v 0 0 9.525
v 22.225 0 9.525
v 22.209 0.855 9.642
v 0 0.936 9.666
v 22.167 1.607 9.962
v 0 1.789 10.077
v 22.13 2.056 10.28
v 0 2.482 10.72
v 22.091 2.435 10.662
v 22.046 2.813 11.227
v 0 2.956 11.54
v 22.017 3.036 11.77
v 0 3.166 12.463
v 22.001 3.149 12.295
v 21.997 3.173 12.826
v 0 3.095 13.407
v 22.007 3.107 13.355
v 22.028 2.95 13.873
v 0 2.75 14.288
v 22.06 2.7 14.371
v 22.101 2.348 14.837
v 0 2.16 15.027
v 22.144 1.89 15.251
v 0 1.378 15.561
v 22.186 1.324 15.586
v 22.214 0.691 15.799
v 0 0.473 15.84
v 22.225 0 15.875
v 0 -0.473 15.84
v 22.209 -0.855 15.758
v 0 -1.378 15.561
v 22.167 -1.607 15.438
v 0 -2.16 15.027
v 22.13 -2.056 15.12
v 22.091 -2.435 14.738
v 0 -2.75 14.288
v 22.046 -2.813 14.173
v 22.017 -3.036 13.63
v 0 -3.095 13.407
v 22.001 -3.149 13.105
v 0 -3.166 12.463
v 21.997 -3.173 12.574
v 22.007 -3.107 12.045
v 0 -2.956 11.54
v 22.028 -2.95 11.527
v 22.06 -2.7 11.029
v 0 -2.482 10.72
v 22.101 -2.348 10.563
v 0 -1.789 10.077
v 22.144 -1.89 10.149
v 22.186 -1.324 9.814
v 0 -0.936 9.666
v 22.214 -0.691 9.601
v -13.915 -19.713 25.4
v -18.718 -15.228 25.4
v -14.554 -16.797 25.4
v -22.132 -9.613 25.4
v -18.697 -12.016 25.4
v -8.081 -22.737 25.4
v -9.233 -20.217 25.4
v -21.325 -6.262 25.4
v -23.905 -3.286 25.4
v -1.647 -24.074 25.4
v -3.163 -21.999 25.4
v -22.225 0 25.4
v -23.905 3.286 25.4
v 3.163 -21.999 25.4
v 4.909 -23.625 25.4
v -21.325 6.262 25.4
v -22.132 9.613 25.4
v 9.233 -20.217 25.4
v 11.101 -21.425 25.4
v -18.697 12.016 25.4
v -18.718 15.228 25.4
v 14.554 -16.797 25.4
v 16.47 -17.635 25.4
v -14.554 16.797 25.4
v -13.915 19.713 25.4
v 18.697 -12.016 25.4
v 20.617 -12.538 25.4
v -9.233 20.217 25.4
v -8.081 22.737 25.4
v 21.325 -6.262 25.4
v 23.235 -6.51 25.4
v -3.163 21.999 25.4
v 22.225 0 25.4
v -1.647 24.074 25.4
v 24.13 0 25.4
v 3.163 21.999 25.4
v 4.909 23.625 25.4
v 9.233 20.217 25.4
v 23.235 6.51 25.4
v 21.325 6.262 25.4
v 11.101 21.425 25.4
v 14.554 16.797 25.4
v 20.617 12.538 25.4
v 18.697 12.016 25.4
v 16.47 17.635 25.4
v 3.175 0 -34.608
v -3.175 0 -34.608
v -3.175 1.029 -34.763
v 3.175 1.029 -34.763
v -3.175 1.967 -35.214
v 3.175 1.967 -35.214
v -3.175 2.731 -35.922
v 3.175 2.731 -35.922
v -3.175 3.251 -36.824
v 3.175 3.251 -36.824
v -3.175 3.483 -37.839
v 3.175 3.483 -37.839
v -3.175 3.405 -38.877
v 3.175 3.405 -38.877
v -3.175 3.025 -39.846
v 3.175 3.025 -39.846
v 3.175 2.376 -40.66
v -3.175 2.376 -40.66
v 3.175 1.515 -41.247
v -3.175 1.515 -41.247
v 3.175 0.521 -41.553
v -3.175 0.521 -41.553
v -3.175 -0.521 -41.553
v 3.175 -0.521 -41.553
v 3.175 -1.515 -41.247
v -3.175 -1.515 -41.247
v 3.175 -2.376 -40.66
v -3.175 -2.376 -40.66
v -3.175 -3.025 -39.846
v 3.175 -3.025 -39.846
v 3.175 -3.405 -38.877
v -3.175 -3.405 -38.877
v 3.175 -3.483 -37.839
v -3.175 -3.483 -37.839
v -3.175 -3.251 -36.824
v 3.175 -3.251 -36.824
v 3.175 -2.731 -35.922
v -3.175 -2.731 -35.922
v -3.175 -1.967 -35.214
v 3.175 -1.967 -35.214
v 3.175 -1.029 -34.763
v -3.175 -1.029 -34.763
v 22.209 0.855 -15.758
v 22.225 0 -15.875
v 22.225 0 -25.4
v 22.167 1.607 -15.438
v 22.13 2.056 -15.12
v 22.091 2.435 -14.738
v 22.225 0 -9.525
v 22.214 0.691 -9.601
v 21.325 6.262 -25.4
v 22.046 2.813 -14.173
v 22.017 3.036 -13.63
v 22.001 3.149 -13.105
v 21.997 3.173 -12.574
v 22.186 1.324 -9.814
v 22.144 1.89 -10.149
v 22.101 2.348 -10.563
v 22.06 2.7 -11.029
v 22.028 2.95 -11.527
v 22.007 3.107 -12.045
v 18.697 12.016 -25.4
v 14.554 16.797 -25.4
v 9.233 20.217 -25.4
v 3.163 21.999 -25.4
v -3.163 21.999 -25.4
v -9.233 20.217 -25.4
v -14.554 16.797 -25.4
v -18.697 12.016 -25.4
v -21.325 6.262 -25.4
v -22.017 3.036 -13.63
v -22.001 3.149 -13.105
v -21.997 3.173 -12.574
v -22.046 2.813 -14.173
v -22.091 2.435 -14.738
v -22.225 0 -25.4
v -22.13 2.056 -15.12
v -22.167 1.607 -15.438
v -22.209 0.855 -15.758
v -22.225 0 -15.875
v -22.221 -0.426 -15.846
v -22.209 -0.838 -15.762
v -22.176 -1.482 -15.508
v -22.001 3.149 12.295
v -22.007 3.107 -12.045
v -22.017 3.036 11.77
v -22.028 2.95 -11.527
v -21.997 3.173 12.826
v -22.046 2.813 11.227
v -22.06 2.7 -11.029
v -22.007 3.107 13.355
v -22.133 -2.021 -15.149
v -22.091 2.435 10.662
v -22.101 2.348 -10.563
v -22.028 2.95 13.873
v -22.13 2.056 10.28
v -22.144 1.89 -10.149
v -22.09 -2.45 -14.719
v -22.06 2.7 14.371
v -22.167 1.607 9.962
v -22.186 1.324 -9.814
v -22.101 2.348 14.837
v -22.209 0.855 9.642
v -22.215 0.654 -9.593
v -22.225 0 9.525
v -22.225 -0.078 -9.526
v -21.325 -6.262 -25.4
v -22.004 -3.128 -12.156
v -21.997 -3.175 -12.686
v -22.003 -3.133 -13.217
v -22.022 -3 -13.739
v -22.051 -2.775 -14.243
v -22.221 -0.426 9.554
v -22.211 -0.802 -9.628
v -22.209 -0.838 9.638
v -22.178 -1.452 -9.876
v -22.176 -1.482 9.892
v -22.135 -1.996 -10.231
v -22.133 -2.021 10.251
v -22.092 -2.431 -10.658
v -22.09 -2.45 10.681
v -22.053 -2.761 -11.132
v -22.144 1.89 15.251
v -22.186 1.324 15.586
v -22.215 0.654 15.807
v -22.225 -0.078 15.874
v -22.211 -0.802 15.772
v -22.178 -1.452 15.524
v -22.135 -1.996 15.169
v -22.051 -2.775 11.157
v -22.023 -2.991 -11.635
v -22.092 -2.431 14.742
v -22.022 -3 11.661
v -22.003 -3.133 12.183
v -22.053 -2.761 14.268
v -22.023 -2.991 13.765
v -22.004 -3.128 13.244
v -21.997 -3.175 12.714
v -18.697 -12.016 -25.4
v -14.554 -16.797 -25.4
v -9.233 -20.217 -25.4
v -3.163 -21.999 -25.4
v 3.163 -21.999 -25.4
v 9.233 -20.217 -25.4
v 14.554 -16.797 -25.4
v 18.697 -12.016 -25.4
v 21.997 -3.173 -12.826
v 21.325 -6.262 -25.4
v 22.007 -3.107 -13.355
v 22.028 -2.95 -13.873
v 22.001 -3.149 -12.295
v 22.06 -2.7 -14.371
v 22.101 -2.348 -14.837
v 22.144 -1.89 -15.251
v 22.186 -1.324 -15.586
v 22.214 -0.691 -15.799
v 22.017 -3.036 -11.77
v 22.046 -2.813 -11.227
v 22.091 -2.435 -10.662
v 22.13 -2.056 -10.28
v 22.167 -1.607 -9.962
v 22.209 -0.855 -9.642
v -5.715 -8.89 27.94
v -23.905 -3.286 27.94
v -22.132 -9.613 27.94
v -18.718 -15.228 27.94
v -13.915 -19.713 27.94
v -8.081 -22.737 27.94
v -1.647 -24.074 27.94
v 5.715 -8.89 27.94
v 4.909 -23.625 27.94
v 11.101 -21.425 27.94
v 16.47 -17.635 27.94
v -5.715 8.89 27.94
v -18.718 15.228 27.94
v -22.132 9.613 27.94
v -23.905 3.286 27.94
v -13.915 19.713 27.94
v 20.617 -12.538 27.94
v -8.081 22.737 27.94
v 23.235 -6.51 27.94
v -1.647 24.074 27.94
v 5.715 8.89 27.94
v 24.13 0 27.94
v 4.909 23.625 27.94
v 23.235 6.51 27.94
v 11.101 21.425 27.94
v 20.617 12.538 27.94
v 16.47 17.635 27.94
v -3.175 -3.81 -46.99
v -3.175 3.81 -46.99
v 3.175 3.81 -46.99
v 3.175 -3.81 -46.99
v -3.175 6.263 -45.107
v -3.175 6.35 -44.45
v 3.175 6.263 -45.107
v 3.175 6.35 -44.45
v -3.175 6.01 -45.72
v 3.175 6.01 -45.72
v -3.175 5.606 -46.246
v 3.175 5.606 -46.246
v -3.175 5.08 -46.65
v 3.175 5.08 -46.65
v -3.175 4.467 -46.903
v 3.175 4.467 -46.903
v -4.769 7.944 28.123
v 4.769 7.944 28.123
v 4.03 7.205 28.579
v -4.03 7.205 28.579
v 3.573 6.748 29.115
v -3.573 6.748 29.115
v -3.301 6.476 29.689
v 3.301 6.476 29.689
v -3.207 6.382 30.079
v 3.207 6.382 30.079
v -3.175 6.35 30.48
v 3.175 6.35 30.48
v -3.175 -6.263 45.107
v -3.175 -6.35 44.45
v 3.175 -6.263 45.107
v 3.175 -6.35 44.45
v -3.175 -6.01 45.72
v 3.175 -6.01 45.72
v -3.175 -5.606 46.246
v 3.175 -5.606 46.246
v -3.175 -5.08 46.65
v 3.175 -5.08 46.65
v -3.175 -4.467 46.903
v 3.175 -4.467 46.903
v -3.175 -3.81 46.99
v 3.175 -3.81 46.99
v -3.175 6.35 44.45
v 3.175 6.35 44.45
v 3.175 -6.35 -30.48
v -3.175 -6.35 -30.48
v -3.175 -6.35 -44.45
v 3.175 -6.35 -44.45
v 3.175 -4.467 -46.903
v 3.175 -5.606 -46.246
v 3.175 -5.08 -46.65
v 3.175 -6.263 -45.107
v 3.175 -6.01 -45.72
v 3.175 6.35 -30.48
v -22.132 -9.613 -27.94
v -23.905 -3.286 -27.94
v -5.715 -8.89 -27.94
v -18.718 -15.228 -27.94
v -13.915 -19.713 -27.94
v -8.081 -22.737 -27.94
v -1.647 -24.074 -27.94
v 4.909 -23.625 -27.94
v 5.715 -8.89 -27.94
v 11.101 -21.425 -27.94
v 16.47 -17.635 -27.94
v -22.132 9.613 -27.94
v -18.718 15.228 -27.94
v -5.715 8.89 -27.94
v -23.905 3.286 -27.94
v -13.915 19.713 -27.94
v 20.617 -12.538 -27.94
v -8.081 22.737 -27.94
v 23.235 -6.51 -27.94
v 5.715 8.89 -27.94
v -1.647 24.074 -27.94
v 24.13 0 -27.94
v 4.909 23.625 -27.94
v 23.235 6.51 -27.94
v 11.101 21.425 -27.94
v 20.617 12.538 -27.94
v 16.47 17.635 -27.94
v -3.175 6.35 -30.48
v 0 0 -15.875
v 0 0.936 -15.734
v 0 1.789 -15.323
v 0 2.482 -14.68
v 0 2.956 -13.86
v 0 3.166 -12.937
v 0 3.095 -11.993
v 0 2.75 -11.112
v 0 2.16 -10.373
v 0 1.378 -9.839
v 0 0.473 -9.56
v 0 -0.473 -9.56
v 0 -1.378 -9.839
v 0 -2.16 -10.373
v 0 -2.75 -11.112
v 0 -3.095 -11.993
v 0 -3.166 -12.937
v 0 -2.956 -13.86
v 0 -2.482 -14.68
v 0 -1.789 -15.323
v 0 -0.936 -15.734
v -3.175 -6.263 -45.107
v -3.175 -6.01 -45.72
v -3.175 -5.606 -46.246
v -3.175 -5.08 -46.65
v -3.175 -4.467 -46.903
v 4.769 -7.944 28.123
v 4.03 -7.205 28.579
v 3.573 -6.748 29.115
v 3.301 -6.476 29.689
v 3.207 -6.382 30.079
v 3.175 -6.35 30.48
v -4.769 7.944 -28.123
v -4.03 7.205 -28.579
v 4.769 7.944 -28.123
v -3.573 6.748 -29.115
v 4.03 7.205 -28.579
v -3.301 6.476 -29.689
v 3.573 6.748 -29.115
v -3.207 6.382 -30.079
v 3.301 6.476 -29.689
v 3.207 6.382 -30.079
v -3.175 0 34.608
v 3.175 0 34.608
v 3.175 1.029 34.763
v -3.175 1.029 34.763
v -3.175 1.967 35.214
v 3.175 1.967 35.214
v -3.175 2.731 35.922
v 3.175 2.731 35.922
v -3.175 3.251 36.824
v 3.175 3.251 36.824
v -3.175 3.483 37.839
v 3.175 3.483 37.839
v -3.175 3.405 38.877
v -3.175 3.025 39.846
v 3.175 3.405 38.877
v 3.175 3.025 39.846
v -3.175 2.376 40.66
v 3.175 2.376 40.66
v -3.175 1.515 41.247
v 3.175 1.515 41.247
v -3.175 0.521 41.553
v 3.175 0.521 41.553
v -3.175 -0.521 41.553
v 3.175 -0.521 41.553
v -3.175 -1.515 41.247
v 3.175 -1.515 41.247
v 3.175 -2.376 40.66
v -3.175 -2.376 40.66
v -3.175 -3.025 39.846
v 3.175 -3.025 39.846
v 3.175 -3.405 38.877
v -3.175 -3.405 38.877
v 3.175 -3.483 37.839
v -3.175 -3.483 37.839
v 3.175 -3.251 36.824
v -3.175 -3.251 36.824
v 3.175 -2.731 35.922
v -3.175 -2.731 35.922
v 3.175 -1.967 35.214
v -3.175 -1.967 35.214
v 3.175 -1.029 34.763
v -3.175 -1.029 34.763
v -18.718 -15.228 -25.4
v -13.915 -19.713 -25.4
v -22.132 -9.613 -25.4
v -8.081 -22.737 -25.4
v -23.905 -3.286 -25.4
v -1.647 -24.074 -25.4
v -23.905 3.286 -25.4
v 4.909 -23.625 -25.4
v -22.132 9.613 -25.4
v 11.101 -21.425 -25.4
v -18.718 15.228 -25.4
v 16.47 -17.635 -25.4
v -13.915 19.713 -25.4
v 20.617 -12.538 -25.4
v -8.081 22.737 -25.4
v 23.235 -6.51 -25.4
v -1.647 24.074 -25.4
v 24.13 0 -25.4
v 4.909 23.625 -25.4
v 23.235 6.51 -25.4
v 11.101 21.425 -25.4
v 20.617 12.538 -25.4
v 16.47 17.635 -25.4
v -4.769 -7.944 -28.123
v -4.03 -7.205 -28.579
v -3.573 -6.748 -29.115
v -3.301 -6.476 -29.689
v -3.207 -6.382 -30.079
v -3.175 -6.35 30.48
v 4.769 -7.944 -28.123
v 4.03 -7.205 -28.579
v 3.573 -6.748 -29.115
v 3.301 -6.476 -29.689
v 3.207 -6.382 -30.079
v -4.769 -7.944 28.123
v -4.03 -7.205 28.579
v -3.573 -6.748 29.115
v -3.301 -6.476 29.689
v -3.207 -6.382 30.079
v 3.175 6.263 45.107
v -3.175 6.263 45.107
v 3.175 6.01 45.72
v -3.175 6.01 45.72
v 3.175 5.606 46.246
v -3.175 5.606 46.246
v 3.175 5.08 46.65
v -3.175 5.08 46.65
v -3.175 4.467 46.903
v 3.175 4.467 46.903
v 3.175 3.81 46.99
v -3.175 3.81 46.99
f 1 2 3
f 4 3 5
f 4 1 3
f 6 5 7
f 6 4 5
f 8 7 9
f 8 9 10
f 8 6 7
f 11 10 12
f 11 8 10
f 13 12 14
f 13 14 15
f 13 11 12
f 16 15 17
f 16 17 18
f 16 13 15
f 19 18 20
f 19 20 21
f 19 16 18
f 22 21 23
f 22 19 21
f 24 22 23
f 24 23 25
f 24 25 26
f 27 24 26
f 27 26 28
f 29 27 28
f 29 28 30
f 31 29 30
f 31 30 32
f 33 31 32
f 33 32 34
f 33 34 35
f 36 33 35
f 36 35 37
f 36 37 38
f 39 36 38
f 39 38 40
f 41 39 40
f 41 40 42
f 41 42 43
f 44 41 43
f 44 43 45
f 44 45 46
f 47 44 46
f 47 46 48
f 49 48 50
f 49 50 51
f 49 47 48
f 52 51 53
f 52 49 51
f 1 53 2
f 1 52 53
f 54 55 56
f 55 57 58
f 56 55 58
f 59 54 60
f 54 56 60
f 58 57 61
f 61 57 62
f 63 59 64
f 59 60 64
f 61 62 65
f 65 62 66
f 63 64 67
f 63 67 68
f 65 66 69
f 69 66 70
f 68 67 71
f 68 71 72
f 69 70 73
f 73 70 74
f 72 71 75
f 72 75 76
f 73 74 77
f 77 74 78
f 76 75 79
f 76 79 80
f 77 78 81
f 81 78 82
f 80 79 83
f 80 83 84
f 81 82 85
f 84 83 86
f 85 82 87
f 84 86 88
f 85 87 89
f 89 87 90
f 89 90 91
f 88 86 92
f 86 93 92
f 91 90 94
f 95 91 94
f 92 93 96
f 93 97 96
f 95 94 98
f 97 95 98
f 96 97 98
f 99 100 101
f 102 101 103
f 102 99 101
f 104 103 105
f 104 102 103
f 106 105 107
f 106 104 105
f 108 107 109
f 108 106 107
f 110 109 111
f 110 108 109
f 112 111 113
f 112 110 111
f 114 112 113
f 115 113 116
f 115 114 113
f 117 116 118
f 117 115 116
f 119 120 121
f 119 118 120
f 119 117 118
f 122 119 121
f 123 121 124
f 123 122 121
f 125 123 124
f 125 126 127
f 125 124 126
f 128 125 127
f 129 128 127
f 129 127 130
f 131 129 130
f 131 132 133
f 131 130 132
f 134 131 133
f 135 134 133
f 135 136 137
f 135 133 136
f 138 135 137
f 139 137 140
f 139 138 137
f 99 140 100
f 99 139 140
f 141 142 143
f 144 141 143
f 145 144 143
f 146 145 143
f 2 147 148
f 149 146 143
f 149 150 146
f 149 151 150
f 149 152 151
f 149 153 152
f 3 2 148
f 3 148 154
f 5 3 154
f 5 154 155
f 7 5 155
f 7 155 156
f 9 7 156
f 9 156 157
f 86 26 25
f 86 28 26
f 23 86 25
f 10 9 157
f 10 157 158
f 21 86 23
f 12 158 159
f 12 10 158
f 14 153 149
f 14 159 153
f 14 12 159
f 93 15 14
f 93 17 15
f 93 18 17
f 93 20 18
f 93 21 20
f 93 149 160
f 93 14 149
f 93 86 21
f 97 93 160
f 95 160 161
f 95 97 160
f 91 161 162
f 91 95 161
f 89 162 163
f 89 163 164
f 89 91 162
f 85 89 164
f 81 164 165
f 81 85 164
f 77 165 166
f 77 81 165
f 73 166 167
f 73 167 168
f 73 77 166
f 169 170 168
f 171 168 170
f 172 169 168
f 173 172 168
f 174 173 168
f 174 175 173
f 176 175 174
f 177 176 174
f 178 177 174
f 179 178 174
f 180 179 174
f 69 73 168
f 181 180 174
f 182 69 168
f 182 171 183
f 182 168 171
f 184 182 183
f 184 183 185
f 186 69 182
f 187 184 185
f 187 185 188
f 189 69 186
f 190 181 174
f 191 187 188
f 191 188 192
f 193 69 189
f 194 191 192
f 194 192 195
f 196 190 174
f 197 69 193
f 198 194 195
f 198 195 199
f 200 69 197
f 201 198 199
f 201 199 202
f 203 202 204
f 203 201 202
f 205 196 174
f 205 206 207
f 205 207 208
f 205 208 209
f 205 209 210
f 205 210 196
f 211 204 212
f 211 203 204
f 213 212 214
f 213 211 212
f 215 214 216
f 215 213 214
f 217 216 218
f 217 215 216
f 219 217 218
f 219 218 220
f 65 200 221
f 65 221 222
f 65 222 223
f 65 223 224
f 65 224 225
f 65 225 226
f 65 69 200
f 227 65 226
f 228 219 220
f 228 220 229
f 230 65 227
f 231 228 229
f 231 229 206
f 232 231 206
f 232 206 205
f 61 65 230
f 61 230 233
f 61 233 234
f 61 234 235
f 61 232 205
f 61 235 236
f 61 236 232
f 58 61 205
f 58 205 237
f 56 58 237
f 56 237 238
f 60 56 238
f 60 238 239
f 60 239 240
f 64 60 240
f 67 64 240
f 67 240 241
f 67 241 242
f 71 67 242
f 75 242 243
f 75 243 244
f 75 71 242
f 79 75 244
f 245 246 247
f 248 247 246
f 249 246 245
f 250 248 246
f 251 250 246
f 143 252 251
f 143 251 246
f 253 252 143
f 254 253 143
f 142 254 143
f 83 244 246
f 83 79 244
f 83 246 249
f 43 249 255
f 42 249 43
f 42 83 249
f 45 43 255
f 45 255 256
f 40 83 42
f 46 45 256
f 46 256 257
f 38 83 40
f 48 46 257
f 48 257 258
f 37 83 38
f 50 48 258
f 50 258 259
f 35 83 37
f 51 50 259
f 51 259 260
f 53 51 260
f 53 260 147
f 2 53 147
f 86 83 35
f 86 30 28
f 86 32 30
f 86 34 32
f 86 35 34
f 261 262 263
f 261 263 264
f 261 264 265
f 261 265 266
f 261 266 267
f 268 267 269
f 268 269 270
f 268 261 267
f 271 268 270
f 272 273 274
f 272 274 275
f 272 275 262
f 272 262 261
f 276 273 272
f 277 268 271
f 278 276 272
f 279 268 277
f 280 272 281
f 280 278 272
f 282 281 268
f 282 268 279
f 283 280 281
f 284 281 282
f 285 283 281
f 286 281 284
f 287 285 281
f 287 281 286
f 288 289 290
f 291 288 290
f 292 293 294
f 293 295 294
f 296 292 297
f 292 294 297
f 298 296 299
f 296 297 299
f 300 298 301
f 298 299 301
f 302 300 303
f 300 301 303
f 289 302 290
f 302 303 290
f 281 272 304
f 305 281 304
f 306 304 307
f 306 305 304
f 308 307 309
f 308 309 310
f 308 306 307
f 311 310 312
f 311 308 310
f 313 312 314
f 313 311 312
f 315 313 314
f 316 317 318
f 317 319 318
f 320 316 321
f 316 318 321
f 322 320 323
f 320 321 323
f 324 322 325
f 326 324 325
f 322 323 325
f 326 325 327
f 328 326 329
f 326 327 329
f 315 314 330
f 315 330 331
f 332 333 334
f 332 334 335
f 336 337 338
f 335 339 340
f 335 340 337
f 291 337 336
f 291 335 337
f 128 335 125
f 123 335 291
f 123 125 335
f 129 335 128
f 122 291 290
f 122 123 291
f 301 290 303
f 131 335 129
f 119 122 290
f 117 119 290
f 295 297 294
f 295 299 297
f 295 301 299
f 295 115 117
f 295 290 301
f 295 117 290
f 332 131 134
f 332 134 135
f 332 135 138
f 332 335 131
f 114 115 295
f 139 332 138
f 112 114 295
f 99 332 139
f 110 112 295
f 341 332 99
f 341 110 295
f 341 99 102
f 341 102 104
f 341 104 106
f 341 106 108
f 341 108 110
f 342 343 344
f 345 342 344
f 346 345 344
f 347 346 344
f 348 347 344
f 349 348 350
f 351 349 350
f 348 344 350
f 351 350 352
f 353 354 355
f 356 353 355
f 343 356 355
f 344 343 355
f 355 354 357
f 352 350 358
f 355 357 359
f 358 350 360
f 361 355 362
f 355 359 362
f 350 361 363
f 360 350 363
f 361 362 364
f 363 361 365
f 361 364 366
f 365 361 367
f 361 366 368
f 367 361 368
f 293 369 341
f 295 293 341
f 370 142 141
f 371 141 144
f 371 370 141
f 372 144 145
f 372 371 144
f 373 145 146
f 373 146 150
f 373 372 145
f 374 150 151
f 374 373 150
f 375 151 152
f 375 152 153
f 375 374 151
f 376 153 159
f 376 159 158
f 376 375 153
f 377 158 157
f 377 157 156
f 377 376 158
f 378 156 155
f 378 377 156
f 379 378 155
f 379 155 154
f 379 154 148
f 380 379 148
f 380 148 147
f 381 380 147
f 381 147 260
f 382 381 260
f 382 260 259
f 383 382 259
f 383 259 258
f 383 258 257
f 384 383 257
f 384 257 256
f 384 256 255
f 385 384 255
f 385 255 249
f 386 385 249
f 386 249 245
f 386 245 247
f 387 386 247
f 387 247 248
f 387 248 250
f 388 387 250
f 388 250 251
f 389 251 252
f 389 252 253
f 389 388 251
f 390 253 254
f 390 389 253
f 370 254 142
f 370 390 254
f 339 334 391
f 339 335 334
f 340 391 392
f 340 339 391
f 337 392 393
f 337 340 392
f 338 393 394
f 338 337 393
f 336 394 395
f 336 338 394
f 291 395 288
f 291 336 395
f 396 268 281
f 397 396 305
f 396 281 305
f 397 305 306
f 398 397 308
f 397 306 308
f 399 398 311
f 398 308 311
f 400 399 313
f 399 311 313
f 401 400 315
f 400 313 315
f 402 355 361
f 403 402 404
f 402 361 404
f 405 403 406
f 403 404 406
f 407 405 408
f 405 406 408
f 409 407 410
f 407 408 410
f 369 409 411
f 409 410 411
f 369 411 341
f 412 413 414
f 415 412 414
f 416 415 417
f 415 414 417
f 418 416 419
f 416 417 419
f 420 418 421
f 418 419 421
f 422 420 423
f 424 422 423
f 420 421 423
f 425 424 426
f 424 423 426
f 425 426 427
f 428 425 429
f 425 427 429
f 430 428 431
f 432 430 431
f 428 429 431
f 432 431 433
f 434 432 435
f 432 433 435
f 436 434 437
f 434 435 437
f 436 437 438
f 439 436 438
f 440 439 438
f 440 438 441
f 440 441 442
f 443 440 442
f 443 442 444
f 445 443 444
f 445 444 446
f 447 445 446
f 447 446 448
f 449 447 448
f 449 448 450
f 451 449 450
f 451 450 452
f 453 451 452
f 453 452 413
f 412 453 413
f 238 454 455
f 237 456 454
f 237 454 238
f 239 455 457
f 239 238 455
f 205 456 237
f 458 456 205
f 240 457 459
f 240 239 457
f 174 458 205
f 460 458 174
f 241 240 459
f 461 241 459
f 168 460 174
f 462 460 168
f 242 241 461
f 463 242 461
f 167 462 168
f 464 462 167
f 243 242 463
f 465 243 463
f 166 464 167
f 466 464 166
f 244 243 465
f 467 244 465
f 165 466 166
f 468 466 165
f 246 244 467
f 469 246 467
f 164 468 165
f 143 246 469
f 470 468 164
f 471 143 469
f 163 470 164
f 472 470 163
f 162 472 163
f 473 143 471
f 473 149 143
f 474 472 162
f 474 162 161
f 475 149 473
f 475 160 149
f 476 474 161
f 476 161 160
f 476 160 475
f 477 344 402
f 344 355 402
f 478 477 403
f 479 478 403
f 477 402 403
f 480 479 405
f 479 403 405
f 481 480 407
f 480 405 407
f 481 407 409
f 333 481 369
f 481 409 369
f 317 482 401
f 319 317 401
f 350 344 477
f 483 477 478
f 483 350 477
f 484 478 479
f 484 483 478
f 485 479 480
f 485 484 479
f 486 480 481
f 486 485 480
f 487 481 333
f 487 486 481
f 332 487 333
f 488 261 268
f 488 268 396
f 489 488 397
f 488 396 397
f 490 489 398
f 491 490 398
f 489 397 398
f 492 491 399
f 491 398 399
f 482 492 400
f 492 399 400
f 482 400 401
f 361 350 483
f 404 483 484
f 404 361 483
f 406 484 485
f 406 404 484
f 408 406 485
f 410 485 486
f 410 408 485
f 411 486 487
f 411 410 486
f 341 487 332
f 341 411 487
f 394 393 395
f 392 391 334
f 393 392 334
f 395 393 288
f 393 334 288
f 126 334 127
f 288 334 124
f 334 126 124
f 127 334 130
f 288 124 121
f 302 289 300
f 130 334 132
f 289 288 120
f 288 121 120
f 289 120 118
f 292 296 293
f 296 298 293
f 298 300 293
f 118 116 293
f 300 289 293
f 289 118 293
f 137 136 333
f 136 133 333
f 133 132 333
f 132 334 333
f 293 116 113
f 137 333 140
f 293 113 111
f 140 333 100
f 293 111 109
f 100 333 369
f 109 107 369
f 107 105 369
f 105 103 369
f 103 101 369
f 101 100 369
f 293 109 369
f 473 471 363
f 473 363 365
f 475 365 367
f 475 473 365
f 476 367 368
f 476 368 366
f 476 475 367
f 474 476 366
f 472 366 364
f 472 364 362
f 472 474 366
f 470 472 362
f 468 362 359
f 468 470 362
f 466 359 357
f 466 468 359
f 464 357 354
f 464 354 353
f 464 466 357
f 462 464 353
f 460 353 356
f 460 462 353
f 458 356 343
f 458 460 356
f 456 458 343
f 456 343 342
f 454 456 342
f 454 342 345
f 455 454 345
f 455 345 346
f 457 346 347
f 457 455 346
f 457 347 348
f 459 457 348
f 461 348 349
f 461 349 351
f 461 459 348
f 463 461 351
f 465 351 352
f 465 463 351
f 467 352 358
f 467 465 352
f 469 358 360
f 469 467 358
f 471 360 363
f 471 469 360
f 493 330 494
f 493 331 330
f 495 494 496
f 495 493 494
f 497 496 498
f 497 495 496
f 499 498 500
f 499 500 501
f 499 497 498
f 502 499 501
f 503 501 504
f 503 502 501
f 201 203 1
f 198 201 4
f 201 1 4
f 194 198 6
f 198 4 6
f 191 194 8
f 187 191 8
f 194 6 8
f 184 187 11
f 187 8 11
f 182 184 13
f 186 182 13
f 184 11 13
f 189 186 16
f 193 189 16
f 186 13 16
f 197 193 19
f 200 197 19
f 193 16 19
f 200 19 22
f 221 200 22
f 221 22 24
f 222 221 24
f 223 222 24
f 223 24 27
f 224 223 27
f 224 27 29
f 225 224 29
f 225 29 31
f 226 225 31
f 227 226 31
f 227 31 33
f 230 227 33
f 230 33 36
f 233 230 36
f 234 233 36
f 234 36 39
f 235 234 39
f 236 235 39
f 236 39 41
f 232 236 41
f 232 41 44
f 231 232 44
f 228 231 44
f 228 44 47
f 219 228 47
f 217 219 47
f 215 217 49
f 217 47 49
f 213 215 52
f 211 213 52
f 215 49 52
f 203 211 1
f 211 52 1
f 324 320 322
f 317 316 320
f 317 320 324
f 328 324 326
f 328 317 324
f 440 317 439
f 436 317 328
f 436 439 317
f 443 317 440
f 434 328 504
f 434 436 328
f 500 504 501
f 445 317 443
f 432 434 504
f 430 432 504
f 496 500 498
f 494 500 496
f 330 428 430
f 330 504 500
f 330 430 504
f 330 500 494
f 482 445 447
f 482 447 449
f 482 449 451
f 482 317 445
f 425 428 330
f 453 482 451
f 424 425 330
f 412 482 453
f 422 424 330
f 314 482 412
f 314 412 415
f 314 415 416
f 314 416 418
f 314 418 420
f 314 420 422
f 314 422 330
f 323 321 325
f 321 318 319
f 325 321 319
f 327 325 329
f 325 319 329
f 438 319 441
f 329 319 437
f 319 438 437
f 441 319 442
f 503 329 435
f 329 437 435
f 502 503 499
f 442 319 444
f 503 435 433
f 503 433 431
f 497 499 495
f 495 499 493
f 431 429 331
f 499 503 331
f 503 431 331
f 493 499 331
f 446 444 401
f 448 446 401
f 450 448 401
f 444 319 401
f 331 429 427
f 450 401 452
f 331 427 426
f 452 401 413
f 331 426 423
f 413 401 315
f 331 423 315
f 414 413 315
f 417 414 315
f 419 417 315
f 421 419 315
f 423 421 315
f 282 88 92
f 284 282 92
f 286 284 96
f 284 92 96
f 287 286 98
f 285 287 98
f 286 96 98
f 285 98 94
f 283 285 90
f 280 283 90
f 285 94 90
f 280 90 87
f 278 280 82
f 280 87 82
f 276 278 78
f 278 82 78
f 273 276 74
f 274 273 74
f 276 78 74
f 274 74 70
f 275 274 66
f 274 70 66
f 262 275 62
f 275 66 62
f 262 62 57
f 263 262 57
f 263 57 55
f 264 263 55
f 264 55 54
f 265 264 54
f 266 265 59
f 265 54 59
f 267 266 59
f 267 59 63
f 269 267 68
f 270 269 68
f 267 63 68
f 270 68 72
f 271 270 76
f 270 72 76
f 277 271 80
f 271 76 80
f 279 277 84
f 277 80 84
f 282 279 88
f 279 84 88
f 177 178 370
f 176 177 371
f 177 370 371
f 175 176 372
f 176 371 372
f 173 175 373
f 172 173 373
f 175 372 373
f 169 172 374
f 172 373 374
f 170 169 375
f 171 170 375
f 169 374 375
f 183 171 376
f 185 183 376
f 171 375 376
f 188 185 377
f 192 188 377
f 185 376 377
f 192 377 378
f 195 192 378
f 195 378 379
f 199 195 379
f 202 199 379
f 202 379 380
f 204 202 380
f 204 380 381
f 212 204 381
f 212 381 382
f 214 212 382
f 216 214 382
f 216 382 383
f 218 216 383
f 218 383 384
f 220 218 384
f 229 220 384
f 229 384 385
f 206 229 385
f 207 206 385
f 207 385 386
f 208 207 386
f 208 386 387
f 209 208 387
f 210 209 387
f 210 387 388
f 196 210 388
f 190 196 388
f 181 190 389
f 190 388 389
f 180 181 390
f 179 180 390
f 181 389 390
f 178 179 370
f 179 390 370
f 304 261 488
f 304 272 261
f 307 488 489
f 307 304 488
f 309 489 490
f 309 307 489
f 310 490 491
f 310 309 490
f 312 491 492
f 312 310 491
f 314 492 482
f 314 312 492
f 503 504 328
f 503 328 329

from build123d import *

# Parameters (mm, degrees)
SKETCH1_R               = 22.225
BOSS_EXTRUDE1_DEPTH     = 25.4
SKETCH2_R               = 24.13
BOSS_EXTRUDE2_DEPTH     = 2.54
SKETCH3_W               = 6.35
SKETCH3_H               = 12.7
BOSS_EXTRUDE3_DEPTH     = 19.05
SKETCH4_R               = 3.4925
CUT_EXTRUDE1_DEPTH      = 28.305
FILLET1_R               = 2.54
FILLET1_OF_MIRROR1_R    = 2.54
SKETCH5_R               = 3.175
CUT_EXTRUDE2_DEPTH      = 25.13
CUT_EXTRUDE2_DEPTH_BACK = 25.13


with BuildPart() as part:
    # Sketch1 → Boss-Extrude1 (new body, symmetric)
    with BuildSketch(Plane.XY):
        Circle(SKETCH1_R)
    extrude(amount=BOSS_EXTRUDE1_DEPTH, both=True)

    # Sketch2 → Boss-Extrude2 (add)
    with BuildSketch(Plane.XY.offset(25.4)):
        Circle(SKETCH2_R)
    boss_extrude2 = extrude(amount=BOSS_EXTRUDE2_DEPTH)

    # Sketch3 → Boss-Extrude3 (add)
    with BuildSketch(Plane.XY.offset(27.94)):
        Rectangle(SKETCH3_W, SKETCH3_H)
    boss_extrude3 = extrude(amount=BOSS_EXTRUDE3_DEPTH)

    # Sketch4 → Cut-Extrude1 (cut, through all)
    with BuildSketch(Plane(origin=(3.175, 0, 0), x_dir=(0, 0, -1), z_dir=(1, 0, 0))):
        with Locations((-38.1, 0)):
            Circle(SKETCH4_R)
    cut_extrude1 = extrude(amount=-CUT_EXTRUDE1_DEPTH, mode=Mode.SUBTRACT)

    # Fillet1
    fillet1_edges = [part.edges().sort_by_distance(p)[0] for p in [
        (3.175, 0, 27.94),
        (0, 6.35, 27.94),
        (-3.175, 0, 27.94),
        (0, -6.35, 27.94),
        (0, 6.35, 46.99),
        (0, -6.35, 46.99),
    ]]
    fillet(fillet1_edges, radius=FILLET1_R)

    # Mirror1: Boss-Extrude2, Boss-Extrude3, Cut-Extrude1 across plane
    add(boss_extrude2.mirror(Plane.XY))
    add(boss_extrude3.mirror(Plane.XY))
    add(cut_extrude1.mirror(Plane.XY), mode=Mode.SUBTRACT)

    # Fillet1 of Mirror1
    fillet1_of_mirror1_edges = [part.edges().sort_by_distance(p)[0] for p in [
        (3.175, 0, -27.94),
        (0, 6.35, -27.94),
        (-3.175, 0, -27.94),
        (0, -6.35, -27.94),
        (0, 6.35, -46.99),
        (0, -6.35, -46.99),
    ]]
    fillet(fillet1_of_mirror1_edges, radius=FILLET1_OF_MIRROR1_R)

    # Sketch5 → Cut-Extrude2 (cut, two sides)
    with BuildSketch(Plane(origin=(0, 0, 0), x_dir=(0, 0, -1), z_dir=(1, 0, 0))) as cut_extrude2_sk:
        with Locations((-12.7, 0)):
            Circle(SKETCH5_R)
        with Locations((12.7, 0)):
            Circle(SKETCH5_R)
    extrude(amount=CUT_EXTRUDE2_DEPTH, mode=Mode.SUBTRACT)
    extrude(cut_extrude2_sk.sketch, amount=-CUT_EXTRUDE2_DEPTH_BACK, mode=Mode.SUBTRACT)


solid = part.part
